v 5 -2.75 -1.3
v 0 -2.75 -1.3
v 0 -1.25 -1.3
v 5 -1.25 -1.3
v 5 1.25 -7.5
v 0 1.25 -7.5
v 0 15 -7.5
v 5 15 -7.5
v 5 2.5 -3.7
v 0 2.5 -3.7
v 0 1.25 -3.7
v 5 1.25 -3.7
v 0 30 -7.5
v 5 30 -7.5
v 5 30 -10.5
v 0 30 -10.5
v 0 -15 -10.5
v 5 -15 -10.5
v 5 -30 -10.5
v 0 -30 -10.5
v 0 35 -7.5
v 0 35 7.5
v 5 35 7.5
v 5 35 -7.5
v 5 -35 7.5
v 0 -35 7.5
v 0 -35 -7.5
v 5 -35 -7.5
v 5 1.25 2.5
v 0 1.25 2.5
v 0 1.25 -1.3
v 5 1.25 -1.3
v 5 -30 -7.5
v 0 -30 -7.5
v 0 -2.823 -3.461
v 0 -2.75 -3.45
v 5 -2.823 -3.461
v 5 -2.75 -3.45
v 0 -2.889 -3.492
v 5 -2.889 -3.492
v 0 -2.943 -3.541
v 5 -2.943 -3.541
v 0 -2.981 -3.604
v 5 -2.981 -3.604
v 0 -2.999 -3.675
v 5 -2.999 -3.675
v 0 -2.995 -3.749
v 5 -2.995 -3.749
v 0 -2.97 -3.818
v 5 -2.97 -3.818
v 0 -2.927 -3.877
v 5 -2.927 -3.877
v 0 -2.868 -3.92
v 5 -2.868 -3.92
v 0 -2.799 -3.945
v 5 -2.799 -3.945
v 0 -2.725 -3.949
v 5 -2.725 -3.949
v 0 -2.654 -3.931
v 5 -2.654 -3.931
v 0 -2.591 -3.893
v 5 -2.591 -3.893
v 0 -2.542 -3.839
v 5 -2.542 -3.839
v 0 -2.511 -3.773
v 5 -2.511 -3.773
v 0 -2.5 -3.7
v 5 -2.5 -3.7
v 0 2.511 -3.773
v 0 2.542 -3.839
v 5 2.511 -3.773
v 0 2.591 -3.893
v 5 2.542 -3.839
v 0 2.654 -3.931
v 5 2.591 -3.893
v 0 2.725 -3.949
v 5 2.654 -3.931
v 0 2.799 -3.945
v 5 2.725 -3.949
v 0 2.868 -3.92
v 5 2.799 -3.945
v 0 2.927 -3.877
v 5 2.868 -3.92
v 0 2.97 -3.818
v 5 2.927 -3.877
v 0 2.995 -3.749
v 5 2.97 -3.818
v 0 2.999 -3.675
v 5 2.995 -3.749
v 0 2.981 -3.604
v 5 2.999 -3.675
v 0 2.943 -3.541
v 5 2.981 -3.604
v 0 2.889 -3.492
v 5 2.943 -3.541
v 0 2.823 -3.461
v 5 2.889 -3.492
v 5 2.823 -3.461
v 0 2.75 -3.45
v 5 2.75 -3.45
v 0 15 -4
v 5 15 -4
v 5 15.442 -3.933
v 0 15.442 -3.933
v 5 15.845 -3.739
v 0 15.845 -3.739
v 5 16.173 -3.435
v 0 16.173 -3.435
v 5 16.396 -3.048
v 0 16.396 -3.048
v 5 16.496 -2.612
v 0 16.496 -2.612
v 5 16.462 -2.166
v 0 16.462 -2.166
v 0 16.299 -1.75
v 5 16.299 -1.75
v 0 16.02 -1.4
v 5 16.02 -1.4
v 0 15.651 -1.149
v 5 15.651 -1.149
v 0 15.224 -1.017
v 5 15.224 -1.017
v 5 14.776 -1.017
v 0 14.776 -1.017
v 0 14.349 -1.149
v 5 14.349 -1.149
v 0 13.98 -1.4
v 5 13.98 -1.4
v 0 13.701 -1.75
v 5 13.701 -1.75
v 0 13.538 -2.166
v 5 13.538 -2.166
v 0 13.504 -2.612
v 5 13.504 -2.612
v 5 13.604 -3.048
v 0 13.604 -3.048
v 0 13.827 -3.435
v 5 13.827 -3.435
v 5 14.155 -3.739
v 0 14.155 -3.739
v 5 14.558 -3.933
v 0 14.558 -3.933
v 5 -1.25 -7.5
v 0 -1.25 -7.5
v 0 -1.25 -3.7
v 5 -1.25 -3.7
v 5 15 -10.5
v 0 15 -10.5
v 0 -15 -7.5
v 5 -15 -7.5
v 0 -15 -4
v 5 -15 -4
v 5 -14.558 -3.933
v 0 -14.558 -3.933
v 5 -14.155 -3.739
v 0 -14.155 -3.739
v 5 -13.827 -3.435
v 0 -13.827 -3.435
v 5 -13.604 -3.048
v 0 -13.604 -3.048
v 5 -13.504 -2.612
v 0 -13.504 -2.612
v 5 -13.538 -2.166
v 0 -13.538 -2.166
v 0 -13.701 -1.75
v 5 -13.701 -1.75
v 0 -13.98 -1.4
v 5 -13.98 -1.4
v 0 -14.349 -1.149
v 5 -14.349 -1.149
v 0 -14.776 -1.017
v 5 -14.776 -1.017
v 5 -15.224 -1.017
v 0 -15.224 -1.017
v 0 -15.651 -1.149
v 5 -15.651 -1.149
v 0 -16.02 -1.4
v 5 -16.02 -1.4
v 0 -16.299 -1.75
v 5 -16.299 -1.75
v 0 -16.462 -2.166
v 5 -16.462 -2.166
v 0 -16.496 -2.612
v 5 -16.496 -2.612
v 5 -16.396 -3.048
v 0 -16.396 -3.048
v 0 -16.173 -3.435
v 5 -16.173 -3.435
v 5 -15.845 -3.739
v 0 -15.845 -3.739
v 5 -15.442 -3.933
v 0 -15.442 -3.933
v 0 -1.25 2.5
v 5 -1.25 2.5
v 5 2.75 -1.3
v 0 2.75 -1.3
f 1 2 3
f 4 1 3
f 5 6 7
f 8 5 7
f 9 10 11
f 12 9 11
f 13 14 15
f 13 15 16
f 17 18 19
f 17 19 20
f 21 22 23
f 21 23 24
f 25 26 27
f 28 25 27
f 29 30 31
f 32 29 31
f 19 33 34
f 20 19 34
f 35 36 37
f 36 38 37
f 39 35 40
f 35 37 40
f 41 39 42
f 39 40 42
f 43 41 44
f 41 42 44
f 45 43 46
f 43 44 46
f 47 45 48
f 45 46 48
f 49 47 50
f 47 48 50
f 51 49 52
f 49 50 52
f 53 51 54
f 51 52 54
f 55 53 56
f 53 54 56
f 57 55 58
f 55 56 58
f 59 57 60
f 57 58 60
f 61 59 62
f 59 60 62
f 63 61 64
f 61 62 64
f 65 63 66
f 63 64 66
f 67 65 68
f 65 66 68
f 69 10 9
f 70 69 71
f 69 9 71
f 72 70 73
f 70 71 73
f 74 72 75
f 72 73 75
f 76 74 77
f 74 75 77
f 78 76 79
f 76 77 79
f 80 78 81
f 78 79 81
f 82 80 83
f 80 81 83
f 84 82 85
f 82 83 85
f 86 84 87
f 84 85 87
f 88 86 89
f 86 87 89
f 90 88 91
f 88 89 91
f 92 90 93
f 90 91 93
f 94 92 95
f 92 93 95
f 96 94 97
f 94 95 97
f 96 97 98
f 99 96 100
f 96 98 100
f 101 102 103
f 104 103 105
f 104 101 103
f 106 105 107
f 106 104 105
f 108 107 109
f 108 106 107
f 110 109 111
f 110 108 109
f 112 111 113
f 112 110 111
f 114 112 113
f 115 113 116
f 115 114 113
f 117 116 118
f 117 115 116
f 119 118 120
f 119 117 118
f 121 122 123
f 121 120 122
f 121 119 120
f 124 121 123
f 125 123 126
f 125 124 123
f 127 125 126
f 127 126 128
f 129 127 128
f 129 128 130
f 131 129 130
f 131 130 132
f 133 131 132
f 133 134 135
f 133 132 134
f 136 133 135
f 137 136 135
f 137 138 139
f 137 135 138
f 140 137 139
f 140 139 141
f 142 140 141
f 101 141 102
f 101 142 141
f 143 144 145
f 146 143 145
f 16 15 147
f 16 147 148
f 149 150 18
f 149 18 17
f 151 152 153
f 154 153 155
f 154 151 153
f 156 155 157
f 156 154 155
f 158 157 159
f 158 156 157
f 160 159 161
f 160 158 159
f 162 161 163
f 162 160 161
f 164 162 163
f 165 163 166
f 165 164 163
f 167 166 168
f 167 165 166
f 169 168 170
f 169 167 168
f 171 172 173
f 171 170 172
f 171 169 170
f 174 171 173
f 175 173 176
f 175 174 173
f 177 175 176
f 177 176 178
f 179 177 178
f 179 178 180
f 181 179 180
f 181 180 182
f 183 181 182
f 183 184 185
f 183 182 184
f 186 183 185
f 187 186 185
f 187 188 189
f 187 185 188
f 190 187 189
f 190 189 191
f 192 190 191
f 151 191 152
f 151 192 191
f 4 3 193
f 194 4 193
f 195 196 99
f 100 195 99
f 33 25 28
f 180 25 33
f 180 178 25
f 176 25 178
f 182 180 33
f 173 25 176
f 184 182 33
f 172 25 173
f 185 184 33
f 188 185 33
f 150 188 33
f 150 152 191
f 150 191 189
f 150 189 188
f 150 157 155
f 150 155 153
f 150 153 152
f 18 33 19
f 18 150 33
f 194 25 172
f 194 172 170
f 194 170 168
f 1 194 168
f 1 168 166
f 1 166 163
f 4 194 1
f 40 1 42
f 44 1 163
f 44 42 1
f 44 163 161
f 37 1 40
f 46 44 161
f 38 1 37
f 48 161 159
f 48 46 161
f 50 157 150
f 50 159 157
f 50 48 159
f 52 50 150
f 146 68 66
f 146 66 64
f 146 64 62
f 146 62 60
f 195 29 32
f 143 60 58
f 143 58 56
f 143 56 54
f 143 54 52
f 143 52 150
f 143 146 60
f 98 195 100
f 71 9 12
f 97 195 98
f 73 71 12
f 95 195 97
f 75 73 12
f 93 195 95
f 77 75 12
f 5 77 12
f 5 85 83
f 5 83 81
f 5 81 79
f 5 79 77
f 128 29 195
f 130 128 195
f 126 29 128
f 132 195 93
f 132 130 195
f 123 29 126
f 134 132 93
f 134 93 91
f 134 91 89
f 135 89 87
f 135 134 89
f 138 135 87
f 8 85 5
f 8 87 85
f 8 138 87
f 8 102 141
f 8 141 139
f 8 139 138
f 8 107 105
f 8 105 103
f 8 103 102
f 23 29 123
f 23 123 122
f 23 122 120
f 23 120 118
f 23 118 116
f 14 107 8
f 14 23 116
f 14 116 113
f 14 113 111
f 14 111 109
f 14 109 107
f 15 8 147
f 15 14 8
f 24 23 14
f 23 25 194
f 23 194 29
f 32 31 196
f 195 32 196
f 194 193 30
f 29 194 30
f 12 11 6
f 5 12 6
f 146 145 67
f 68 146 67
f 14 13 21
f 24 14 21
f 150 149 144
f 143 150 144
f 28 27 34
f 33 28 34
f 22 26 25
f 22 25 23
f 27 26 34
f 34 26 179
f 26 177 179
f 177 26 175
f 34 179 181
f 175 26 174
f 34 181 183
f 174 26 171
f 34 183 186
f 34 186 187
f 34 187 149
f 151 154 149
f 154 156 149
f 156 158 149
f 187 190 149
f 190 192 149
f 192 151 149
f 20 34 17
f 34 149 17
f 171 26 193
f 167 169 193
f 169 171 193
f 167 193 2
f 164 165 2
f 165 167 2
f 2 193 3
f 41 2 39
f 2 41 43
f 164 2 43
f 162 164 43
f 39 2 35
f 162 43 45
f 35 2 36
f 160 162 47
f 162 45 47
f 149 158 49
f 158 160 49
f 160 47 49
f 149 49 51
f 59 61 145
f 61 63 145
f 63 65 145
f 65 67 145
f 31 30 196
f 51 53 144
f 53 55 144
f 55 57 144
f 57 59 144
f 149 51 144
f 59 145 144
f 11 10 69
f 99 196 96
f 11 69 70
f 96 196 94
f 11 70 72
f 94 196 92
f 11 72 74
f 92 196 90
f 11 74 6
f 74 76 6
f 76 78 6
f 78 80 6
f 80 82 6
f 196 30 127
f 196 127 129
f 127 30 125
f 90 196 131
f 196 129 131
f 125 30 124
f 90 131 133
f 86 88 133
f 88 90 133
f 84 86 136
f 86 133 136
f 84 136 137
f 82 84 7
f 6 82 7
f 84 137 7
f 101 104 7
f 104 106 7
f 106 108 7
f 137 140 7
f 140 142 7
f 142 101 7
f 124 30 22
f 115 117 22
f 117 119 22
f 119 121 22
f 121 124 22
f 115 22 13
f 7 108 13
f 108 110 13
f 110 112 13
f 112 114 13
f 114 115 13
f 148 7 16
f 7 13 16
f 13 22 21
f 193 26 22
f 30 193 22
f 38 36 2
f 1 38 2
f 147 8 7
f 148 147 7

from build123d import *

# Parameters (mm, degrees)
SCHIZZO1_W                   = 15
SCHIZZO1_H                   = 70
ESTRUSIONE_ESTRUSIONE1_DEPTH = 5
SCHIZZO2_W                   = 5
SCHIZZO2_H                   = 15
ESTRUSIONE_ESTRUSIONE2_DEPTH = 3
SCHIZZO4_R                   = 1.5
TAGLIO_ESTRUSIONE2_DEPTH     = 6
SCHIZZO5_R                   = 0.25
TAGLIO_ESTRUSIONE3_DEPTH     = 10


with BuildPart() as part:
    # Schizzo1 → Estrusione-Estrusione1 (new body)
    with BuildSketch(Plane(origin=(0, 0, 0), x_dir=(0, 0, -1), z_dir=(1, 0, 0))):
        Rectangle(SCHIZZO1_W, SCHIZZO1_H)
    extrude(amount=ESTRUSIONE_ESTRUSIONE1_DEPTH)

    # Schizzo2 → Estrusione-Estrusione2 (add)
    with BuildSketch(Plane(origin=(0, 0, -7.5), x_dir=(-1, 0, 0), z_dir=(0, 0, -1))):
        with Locations((-2.5, 22.5)):
            Rectangle(SCHIZZO2_W, SCHIZZO2_H)
        with Locations((-2.5, -22.5)):
            Rectangle(SCHIZZO2_W, SCHIZZO2_H)
    extrude(amount=ESTRUSIONE_ESTRUSIONE2_DEPTH)

    # Schizzo4 → Taglio-Estrusione2 (cut, through all)
    with BuildSketch(Plane(origin=(0, 0, 0), x_dir=(0, 0, -1), z_dir=(1, 0, 0))):
        with Locations((2.5, 15)):
            Circle(SCHIZZO4_R)
        with Locations((2.5, -15)):
            Circle(SCHIZZO4_R)
        Polygon((-2.5, 1.25), (1.3, 1.25), (1.3, 2.75), (3.7, 2.75), (3.7, 1.25), (7.5, 1.25), (7.5, -1.25), (3.7, -1.25), (3.7, -2.75), (1.3, -2.75), (1.3, -1.25), (-2.5, -1.25), align=None)
    extrude(amount=TAGLIO_ESTRUSIONE2_DEPTH, mode=Mode.SUBTRACT)

    # Schizzo5 → Taglio-Estrusione3 (cut)
    with BuildSketch(Plane(origin=(5, 0, 0), x_dir=(0, 0, -1), z_dir=(1, 0, 0))):
        with Locations((3.7, 2.75)):
            Circle(SCHIZZO5_R)
        with Locations((3.7, -2.75)):
            Circle(SCHIZZO5_R)
    extrude(amount=-TAGLIO_ESTRUSIONE3_DEPTH, mode=Mode.SUBTRACT)


solid = part.part
